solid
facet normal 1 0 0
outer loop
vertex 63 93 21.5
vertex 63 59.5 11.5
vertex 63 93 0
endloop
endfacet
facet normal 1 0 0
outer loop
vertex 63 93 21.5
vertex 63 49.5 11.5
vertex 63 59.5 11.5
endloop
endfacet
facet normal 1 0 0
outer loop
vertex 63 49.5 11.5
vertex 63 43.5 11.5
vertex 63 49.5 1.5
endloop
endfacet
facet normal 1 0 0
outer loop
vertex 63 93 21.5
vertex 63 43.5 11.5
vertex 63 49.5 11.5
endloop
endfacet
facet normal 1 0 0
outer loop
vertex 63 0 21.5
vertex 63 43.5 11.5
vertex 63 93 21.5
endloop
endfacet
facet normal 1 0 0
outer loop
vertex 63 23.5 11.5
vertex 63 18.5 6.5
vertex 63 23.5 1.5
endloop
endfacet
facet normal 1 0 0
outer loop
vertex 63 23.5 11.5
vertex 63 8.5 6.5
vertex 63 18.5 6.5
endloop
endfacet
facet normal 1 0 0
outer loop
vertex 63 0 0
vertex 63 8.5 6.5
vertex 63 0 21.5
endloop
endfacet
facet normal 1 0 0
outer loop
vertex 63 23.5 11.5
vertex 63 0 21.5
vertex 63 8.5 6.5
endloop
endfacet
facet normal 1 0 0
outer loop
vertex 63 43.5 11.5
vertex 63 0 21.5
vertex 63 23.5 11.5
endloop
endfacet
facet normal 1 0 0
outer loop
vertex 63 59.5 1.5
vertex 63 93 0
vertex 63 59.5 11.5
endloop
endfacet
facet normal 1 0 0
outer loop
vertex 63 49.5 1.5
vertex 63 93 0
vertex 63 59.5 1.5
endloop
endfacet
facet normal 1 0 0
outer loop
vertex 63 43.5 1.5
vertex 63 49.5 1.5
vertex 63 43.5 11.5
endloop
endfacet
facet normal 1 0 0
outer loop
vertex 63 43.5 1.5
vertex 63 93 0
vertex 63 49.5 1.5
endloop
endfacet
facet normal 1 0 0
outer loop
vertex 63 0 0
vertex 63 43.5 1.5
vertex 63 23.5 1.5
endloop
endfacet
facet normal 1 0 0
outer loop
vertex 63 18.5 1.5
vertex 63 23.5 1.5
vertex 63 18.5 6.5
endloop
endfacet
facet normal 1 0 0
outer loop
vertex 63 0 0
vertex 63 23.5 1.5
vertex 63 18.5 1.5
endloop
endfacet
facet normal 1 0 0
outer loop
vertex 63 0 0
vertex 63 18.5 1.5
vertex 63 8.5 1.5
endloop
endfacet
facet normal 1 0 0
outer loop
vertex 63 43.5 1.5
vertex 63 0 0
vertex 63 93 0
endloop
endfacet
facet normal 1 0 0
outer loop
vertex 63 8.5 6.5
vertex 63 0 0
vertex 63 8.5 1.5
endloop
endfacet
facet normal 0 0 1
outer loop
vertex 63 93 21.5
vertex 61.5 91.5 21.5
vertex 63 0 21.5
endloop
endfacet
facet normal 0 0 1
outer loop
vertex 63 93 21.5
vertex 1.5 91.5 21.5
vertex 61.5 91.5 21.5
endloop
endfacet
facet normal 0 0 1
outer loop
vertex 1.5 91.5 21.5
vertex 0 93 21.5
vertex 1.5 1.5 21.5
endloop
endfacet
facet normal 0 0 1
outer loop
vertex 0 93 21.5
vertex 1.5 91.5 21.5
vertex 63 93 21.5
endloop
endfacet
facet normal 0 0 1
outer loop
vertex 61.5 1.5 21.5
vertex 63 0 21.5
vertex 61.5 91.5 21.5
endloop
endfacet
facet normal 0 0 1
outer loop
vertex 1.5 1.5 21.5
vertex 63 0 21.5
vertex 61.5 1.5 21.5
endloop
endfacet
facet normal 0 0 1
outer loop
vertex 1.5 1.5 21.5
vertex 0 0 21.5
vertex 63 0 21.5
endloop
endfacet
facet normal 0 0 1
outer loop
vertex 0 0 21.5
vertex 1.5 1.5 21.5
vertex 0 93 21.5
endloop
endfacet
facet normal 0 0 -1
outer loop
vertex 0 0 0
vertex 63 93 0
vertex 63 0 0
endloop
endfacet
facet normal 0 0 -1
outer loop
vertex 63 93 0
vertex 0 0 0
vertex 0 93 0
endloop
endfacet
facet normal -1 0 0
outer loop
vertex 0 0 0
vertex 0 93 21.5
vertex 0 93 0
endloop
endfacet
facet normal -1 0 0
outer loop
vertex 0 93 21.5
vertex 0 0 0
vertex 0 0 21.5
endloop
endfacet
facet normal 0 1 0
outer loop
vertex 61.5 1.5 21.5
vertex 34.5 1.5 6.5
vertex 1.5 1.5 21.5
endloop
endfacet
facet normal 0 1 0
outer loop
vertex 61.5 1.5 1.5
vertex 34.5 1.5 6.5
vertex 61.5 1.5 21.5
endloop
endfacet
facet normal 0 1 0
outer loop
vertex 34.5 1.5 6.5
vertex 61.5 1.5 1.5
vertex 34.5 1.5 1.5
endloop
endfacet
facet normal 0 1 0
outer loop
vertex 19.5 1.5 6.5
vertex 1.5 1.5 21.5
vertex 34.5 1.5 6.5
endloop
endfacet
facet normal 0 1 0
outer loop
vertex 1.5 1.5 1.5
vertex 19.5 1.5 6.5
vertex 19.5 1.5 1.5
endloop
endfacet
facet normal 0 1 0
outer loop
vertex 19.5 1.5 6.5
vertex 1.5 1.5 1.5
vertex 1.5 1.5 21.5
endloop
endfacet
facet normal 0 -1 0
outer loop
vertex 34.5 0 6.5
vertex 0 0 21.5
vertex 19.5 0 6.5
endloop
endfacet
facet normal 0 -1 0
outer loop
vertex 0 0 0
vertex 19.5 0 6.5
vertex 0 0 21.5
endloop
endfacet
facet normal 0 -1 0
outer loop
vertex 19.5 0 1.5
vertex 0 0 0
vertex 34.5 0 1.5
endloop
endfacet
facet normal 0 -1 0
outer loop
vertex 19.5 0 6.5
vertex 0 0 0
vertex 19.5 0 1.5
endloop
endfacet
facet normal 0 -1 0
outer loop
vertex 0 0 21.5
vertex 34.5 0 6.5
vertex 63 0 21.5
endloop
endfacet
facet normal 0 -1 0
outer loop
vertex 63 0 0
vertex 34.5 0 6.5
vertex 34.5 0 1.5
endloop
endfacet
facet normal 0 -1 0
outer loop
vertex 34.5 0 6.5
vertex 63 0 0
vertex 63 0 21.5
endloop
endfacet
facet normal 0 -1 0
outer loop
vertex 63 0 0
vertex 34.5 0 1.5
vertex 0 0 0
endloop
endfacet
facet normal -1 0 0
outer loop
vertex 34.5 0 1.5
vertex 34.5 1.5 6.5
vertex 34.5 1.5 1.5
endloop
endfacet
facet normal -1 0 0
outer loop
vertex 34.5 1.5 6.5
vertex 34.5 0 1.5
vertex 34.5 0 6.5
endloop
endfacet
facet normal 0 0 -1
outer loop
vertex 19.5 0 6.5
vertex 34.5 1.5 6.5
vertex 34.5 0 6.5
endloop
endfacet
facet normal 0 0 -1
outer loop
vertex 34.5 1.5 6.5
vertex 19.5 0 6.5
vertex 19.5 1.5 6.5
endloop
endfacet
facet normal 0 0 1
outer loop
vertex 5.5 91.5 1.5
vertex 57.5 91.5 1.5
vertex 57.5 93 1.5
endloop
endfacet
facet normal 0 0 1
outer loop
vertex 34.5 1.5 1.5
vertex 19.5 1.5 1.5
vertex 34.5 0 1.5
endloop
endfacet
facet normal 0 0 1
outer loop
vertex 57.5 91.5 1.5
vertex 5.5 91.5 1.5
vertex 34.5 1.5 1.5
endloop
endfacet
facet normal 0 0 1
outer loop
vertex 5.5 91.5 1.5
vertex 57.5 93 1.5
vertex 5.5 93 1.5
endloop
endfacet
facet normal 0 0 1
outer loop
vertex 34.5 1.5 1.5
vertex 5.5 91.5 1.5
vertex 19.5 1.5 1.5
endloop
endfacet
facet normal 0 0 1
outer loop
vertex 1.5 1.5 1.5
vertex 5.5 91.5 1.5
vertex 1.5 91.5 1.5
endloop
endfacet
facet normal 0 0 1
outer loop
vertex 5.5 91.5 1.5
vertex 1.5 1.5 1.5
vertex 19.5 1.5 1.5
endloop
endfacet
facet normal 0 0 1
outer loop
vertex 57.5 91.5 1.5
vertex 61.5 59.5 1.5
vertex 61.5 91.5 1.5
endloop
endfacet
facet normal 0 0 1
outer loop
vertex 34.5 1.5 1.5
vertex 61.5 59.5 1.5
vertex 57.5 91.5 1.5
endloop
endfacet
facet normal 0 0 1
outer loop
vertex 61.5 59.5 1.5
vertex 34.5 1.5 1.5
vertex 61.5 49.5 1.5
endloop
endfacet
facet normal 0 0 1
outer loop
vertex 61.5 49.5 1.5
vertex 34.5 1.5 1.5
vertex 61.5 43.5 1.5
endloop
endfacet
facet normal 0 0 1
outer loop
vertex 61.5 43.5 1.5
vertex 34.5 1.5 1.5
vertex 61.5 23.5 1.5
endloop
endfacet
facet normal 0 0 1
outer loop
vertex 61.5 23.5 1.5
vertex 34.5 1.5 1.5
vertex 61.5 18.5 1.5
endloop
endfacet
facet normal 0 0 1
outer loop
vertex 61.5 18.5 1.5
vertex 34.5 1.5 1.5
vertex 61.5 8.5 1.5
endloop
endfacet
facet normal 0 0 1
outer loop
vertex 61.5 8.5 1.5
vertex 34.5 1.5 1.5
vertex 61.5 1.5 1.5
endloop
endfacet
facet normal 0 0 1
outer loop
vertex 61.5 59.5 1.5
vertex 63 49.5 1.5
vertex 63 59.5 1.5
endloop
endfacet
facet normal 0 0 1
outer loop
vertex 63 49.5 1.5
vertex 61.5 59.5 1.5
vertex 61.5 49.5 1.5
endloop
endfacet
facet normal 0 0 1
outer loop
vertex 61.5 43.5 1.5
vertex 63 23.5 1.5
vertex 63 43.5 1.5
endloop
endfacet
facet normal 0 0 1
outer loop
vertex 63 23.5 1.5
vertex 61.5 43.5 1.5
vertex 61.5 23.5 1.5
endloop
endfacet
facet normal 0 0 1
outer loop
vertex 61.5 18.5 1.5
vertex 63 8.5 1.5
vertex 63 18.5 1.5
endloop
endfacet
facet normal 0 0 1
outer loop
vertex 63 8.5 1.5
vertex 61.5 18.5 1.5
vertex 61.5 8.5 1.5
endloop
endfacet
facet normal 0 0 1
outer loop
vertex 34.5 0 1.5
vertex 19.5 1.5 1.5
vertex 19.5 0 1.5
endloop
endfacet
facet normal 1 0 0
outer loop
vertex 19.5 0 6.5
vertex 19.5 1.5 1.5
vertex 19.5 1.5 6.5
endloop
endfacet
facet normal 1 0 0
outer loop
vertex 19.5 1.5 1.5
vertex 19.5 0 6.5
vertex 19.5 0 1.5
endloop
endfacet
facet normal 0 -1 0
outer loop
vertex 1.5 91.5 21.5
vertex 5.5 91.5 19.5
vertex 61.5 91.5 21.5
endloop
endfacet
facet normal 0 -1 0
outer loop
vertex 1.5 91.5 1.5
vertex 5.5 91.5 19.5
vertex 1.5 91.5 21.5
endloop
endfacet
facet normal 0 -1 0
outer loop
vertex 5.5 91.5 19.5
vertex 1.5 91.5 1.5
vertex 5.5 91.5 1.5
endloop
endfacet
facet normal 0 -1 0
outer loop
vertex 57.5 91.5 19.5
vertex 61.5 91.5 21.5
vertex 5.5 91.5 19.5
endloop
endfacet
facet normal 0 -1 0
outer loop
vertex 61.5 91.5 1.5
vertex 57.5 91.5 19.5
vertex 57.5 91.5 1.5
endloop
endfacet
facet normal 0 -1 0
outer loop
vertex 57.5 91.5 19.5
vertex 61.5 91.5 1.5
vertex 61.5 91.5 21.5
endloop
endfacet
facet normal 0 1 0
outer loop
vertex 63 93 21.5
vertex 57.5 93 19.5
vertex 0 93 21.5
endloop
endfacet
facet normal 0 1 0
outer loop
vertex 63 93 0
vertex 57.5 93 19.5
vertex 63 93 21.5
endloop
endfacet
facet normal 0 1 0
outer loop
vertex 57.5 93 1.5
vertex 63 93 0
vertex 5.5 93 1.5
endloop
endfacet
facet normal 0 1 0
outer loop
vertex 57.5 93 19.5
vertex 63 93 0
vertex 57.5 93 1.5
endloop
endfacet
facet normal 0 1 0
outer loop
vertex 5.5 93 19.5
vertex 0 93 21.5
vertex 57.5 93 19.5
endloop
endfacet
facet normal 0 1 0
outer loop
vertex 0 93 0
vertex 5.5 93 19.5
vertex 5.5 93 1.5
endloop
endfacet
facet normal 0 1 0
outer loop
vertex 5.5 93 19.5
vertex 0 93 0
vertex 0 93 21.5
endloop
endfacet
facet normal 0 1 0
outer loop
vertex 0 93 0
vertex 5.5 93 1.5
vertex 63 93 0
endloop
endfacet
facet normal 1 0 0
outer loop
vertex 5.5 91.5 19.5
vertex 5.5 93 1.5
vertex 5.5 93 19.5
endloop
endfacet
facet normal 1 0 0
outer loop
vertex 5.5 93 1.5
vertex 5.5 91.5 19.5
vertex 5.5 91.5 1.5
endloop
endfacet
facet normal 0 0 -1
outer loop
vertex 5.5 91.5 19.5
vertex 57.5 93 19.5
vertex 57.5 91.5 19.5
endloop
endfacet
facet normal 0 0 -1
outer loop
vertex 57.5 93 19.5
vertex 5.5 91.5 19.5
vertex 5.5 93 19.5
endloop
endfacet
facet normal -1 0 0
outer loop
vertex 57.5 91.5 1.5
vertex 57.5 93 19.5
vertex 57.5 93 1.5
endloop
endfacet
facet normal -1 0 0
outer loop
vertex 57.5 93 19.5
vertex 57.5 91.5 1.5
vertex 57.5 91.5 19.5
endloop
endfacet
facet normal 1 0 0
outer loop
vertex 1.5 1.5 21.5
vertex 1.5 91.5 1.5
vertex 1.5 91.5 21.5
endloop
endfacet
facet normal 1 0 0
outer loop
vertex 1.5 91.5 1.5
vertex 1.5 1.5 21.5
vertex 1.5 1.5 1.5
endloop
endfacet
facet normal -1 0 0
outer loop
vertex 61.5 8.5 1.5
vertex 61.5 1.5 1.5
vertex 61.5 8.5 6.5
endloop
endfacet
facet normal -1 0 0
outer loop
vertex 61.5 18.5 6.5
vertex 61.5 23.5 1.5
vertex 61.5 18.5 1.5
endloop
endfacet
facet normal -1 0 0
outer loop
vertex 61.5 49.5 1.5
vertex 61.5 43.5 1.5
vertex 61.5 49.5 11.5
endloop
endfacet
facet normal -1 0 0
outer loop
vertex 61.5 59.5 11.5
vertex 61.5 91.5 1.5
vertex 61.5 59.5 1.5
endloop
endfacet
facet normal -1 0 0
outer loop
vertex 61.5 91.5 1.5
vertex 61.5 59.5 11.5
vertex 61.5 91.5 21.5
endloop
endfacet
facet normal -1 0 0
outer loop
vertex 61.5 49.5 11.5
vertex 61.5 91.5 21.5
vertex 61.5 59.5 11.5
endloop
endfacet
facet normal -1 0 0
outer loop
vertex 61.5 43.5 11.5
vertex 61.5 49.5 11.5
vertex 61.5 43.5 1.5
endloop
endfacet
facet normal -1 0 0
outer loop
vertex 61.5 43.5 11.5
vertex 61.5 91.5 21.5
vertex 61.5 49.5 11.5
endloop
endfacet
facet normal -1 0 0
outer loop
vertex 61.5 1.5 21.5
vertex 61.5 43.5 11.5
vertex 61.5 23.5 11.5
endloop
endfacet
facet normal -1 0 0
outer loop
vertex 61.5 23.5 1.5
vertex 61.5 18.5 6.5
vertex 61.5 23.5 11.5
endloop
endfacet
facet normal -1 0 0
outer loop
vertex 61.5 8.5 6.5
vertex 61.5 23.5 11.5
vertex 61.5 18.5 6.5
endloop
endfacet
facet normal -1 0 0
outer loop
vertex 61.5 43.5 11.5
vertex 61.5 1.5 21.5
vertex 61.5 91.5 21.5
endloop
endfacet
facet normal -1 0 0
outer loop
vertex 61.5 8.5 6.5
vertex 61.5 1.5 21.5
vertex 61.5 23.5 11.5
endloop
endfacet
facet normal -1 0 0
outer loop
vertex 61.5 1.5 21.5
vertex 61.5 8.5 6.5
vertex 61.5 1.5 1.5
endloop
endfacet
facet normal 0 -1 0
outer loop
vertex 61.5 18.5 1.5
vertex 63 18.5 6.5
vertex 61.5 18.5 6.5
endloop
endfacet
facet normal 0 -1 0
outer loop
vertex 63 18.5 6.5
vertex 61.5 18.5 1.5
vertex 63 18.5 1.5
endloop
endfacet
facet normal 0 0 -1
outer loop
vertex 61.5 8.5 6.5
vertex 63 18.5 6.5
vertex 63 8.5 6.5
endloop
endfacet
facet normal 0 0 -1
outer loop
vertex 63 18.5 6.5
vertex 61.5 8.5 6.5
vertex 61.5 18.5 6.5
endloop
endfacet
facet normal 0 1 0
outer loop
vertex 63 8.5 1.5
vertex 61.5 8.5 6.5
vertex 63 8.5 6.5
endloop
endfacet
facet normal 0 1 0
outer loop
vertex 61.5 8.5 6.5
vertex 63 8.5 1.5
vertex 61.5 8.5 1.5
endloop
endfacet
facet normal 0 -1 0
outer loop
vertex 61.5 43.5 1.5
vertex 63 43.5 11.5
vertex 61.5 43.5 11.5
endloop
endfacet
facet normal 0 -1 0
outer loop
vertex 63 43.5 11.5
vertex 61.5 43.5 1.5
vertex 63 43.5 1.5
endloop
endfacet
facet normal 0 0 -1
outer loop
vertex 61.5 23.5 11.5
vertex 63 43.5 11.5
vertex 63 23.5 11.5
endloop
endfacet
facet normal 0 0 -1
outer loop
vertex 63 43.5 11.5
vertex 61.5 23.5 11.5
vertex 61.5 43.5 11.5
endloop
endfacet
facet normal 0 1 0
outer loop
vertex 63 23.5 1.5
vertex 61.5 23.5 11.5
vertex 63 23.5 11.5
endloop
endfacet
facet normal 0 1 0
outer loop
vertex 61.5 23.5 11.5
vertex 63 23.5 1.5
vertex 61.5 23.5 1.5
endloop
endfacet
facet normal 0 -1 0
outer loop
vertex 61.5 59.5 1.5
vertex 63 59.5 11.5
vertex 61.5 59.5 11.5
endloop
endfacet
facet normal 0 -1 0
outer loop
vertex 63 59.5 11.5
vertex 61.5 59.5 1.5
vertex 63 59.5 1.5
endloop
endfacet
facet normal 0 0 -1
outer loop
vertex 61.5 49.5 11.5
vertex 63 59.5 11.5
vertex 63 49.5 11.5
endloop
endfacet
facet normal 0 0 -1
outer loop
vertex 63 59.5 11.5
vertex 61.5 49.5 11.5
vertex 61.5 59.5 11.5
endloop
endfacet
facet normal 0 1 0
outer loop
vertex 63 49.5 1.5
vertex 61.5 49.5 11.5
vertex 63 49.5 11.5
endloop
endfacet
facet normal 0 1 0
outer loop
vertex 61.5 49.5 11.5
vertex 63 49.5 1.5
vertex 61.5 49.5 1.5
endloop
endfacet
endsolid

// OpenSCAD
l=90;
w=60;
h=20;
t=1.5;

slot=0;
trim=0;

module cutout(x,z,len,height)
{
    translate([x+t,-t,z+t]){
        cube([len,3*t,height]);
    }
}

// Bottom
cube([w+2*t,l+2*t,t]);


// Front
translate([0,0,0]){
    rotate([0,0,0]){ 
        difference(){
           cube([w+2*t,t,h+t]);
            
           translate([0,-t,h+t-trim]){
               cube([w*2*t,3*t,trim]);
           }
           cutout(18,0,15,5);
        }
    }
}

// Back
translate([w+2*t,l+2*t,0]){
    rotate([0,0,180]){
        difference(){
           cube([w+2*t,t,h+t]);
            
            cutout(4,0,52,18);
        }
    }
}

// Left
translate([0,l+2*t,0]){
    rotate([0,0,-90]){ 
        difference() {
           cube([l+2*t,t,h+t]);
           translate([0,t-slot,h+t-slot-1]){
               cube([l+2*t,slot+.2,slot]);
           }
        }
    }
}

// Right
translate([w+2*t,0,0]){
    rotate([0,0,90]){
        difference(){ 
           cube([l+2*t,t,h+t]);
            
            translate([0,t-slot,h+t-slot-1]){
               cube([l+2*t,slot+0.2,slot]);
           }
            //cutout(5,0,60,8);
            cutout(7,0,10,5);
            cutout(22,0,20,10);
            cutout(48,0,10,10);
            
        }
    }
}
